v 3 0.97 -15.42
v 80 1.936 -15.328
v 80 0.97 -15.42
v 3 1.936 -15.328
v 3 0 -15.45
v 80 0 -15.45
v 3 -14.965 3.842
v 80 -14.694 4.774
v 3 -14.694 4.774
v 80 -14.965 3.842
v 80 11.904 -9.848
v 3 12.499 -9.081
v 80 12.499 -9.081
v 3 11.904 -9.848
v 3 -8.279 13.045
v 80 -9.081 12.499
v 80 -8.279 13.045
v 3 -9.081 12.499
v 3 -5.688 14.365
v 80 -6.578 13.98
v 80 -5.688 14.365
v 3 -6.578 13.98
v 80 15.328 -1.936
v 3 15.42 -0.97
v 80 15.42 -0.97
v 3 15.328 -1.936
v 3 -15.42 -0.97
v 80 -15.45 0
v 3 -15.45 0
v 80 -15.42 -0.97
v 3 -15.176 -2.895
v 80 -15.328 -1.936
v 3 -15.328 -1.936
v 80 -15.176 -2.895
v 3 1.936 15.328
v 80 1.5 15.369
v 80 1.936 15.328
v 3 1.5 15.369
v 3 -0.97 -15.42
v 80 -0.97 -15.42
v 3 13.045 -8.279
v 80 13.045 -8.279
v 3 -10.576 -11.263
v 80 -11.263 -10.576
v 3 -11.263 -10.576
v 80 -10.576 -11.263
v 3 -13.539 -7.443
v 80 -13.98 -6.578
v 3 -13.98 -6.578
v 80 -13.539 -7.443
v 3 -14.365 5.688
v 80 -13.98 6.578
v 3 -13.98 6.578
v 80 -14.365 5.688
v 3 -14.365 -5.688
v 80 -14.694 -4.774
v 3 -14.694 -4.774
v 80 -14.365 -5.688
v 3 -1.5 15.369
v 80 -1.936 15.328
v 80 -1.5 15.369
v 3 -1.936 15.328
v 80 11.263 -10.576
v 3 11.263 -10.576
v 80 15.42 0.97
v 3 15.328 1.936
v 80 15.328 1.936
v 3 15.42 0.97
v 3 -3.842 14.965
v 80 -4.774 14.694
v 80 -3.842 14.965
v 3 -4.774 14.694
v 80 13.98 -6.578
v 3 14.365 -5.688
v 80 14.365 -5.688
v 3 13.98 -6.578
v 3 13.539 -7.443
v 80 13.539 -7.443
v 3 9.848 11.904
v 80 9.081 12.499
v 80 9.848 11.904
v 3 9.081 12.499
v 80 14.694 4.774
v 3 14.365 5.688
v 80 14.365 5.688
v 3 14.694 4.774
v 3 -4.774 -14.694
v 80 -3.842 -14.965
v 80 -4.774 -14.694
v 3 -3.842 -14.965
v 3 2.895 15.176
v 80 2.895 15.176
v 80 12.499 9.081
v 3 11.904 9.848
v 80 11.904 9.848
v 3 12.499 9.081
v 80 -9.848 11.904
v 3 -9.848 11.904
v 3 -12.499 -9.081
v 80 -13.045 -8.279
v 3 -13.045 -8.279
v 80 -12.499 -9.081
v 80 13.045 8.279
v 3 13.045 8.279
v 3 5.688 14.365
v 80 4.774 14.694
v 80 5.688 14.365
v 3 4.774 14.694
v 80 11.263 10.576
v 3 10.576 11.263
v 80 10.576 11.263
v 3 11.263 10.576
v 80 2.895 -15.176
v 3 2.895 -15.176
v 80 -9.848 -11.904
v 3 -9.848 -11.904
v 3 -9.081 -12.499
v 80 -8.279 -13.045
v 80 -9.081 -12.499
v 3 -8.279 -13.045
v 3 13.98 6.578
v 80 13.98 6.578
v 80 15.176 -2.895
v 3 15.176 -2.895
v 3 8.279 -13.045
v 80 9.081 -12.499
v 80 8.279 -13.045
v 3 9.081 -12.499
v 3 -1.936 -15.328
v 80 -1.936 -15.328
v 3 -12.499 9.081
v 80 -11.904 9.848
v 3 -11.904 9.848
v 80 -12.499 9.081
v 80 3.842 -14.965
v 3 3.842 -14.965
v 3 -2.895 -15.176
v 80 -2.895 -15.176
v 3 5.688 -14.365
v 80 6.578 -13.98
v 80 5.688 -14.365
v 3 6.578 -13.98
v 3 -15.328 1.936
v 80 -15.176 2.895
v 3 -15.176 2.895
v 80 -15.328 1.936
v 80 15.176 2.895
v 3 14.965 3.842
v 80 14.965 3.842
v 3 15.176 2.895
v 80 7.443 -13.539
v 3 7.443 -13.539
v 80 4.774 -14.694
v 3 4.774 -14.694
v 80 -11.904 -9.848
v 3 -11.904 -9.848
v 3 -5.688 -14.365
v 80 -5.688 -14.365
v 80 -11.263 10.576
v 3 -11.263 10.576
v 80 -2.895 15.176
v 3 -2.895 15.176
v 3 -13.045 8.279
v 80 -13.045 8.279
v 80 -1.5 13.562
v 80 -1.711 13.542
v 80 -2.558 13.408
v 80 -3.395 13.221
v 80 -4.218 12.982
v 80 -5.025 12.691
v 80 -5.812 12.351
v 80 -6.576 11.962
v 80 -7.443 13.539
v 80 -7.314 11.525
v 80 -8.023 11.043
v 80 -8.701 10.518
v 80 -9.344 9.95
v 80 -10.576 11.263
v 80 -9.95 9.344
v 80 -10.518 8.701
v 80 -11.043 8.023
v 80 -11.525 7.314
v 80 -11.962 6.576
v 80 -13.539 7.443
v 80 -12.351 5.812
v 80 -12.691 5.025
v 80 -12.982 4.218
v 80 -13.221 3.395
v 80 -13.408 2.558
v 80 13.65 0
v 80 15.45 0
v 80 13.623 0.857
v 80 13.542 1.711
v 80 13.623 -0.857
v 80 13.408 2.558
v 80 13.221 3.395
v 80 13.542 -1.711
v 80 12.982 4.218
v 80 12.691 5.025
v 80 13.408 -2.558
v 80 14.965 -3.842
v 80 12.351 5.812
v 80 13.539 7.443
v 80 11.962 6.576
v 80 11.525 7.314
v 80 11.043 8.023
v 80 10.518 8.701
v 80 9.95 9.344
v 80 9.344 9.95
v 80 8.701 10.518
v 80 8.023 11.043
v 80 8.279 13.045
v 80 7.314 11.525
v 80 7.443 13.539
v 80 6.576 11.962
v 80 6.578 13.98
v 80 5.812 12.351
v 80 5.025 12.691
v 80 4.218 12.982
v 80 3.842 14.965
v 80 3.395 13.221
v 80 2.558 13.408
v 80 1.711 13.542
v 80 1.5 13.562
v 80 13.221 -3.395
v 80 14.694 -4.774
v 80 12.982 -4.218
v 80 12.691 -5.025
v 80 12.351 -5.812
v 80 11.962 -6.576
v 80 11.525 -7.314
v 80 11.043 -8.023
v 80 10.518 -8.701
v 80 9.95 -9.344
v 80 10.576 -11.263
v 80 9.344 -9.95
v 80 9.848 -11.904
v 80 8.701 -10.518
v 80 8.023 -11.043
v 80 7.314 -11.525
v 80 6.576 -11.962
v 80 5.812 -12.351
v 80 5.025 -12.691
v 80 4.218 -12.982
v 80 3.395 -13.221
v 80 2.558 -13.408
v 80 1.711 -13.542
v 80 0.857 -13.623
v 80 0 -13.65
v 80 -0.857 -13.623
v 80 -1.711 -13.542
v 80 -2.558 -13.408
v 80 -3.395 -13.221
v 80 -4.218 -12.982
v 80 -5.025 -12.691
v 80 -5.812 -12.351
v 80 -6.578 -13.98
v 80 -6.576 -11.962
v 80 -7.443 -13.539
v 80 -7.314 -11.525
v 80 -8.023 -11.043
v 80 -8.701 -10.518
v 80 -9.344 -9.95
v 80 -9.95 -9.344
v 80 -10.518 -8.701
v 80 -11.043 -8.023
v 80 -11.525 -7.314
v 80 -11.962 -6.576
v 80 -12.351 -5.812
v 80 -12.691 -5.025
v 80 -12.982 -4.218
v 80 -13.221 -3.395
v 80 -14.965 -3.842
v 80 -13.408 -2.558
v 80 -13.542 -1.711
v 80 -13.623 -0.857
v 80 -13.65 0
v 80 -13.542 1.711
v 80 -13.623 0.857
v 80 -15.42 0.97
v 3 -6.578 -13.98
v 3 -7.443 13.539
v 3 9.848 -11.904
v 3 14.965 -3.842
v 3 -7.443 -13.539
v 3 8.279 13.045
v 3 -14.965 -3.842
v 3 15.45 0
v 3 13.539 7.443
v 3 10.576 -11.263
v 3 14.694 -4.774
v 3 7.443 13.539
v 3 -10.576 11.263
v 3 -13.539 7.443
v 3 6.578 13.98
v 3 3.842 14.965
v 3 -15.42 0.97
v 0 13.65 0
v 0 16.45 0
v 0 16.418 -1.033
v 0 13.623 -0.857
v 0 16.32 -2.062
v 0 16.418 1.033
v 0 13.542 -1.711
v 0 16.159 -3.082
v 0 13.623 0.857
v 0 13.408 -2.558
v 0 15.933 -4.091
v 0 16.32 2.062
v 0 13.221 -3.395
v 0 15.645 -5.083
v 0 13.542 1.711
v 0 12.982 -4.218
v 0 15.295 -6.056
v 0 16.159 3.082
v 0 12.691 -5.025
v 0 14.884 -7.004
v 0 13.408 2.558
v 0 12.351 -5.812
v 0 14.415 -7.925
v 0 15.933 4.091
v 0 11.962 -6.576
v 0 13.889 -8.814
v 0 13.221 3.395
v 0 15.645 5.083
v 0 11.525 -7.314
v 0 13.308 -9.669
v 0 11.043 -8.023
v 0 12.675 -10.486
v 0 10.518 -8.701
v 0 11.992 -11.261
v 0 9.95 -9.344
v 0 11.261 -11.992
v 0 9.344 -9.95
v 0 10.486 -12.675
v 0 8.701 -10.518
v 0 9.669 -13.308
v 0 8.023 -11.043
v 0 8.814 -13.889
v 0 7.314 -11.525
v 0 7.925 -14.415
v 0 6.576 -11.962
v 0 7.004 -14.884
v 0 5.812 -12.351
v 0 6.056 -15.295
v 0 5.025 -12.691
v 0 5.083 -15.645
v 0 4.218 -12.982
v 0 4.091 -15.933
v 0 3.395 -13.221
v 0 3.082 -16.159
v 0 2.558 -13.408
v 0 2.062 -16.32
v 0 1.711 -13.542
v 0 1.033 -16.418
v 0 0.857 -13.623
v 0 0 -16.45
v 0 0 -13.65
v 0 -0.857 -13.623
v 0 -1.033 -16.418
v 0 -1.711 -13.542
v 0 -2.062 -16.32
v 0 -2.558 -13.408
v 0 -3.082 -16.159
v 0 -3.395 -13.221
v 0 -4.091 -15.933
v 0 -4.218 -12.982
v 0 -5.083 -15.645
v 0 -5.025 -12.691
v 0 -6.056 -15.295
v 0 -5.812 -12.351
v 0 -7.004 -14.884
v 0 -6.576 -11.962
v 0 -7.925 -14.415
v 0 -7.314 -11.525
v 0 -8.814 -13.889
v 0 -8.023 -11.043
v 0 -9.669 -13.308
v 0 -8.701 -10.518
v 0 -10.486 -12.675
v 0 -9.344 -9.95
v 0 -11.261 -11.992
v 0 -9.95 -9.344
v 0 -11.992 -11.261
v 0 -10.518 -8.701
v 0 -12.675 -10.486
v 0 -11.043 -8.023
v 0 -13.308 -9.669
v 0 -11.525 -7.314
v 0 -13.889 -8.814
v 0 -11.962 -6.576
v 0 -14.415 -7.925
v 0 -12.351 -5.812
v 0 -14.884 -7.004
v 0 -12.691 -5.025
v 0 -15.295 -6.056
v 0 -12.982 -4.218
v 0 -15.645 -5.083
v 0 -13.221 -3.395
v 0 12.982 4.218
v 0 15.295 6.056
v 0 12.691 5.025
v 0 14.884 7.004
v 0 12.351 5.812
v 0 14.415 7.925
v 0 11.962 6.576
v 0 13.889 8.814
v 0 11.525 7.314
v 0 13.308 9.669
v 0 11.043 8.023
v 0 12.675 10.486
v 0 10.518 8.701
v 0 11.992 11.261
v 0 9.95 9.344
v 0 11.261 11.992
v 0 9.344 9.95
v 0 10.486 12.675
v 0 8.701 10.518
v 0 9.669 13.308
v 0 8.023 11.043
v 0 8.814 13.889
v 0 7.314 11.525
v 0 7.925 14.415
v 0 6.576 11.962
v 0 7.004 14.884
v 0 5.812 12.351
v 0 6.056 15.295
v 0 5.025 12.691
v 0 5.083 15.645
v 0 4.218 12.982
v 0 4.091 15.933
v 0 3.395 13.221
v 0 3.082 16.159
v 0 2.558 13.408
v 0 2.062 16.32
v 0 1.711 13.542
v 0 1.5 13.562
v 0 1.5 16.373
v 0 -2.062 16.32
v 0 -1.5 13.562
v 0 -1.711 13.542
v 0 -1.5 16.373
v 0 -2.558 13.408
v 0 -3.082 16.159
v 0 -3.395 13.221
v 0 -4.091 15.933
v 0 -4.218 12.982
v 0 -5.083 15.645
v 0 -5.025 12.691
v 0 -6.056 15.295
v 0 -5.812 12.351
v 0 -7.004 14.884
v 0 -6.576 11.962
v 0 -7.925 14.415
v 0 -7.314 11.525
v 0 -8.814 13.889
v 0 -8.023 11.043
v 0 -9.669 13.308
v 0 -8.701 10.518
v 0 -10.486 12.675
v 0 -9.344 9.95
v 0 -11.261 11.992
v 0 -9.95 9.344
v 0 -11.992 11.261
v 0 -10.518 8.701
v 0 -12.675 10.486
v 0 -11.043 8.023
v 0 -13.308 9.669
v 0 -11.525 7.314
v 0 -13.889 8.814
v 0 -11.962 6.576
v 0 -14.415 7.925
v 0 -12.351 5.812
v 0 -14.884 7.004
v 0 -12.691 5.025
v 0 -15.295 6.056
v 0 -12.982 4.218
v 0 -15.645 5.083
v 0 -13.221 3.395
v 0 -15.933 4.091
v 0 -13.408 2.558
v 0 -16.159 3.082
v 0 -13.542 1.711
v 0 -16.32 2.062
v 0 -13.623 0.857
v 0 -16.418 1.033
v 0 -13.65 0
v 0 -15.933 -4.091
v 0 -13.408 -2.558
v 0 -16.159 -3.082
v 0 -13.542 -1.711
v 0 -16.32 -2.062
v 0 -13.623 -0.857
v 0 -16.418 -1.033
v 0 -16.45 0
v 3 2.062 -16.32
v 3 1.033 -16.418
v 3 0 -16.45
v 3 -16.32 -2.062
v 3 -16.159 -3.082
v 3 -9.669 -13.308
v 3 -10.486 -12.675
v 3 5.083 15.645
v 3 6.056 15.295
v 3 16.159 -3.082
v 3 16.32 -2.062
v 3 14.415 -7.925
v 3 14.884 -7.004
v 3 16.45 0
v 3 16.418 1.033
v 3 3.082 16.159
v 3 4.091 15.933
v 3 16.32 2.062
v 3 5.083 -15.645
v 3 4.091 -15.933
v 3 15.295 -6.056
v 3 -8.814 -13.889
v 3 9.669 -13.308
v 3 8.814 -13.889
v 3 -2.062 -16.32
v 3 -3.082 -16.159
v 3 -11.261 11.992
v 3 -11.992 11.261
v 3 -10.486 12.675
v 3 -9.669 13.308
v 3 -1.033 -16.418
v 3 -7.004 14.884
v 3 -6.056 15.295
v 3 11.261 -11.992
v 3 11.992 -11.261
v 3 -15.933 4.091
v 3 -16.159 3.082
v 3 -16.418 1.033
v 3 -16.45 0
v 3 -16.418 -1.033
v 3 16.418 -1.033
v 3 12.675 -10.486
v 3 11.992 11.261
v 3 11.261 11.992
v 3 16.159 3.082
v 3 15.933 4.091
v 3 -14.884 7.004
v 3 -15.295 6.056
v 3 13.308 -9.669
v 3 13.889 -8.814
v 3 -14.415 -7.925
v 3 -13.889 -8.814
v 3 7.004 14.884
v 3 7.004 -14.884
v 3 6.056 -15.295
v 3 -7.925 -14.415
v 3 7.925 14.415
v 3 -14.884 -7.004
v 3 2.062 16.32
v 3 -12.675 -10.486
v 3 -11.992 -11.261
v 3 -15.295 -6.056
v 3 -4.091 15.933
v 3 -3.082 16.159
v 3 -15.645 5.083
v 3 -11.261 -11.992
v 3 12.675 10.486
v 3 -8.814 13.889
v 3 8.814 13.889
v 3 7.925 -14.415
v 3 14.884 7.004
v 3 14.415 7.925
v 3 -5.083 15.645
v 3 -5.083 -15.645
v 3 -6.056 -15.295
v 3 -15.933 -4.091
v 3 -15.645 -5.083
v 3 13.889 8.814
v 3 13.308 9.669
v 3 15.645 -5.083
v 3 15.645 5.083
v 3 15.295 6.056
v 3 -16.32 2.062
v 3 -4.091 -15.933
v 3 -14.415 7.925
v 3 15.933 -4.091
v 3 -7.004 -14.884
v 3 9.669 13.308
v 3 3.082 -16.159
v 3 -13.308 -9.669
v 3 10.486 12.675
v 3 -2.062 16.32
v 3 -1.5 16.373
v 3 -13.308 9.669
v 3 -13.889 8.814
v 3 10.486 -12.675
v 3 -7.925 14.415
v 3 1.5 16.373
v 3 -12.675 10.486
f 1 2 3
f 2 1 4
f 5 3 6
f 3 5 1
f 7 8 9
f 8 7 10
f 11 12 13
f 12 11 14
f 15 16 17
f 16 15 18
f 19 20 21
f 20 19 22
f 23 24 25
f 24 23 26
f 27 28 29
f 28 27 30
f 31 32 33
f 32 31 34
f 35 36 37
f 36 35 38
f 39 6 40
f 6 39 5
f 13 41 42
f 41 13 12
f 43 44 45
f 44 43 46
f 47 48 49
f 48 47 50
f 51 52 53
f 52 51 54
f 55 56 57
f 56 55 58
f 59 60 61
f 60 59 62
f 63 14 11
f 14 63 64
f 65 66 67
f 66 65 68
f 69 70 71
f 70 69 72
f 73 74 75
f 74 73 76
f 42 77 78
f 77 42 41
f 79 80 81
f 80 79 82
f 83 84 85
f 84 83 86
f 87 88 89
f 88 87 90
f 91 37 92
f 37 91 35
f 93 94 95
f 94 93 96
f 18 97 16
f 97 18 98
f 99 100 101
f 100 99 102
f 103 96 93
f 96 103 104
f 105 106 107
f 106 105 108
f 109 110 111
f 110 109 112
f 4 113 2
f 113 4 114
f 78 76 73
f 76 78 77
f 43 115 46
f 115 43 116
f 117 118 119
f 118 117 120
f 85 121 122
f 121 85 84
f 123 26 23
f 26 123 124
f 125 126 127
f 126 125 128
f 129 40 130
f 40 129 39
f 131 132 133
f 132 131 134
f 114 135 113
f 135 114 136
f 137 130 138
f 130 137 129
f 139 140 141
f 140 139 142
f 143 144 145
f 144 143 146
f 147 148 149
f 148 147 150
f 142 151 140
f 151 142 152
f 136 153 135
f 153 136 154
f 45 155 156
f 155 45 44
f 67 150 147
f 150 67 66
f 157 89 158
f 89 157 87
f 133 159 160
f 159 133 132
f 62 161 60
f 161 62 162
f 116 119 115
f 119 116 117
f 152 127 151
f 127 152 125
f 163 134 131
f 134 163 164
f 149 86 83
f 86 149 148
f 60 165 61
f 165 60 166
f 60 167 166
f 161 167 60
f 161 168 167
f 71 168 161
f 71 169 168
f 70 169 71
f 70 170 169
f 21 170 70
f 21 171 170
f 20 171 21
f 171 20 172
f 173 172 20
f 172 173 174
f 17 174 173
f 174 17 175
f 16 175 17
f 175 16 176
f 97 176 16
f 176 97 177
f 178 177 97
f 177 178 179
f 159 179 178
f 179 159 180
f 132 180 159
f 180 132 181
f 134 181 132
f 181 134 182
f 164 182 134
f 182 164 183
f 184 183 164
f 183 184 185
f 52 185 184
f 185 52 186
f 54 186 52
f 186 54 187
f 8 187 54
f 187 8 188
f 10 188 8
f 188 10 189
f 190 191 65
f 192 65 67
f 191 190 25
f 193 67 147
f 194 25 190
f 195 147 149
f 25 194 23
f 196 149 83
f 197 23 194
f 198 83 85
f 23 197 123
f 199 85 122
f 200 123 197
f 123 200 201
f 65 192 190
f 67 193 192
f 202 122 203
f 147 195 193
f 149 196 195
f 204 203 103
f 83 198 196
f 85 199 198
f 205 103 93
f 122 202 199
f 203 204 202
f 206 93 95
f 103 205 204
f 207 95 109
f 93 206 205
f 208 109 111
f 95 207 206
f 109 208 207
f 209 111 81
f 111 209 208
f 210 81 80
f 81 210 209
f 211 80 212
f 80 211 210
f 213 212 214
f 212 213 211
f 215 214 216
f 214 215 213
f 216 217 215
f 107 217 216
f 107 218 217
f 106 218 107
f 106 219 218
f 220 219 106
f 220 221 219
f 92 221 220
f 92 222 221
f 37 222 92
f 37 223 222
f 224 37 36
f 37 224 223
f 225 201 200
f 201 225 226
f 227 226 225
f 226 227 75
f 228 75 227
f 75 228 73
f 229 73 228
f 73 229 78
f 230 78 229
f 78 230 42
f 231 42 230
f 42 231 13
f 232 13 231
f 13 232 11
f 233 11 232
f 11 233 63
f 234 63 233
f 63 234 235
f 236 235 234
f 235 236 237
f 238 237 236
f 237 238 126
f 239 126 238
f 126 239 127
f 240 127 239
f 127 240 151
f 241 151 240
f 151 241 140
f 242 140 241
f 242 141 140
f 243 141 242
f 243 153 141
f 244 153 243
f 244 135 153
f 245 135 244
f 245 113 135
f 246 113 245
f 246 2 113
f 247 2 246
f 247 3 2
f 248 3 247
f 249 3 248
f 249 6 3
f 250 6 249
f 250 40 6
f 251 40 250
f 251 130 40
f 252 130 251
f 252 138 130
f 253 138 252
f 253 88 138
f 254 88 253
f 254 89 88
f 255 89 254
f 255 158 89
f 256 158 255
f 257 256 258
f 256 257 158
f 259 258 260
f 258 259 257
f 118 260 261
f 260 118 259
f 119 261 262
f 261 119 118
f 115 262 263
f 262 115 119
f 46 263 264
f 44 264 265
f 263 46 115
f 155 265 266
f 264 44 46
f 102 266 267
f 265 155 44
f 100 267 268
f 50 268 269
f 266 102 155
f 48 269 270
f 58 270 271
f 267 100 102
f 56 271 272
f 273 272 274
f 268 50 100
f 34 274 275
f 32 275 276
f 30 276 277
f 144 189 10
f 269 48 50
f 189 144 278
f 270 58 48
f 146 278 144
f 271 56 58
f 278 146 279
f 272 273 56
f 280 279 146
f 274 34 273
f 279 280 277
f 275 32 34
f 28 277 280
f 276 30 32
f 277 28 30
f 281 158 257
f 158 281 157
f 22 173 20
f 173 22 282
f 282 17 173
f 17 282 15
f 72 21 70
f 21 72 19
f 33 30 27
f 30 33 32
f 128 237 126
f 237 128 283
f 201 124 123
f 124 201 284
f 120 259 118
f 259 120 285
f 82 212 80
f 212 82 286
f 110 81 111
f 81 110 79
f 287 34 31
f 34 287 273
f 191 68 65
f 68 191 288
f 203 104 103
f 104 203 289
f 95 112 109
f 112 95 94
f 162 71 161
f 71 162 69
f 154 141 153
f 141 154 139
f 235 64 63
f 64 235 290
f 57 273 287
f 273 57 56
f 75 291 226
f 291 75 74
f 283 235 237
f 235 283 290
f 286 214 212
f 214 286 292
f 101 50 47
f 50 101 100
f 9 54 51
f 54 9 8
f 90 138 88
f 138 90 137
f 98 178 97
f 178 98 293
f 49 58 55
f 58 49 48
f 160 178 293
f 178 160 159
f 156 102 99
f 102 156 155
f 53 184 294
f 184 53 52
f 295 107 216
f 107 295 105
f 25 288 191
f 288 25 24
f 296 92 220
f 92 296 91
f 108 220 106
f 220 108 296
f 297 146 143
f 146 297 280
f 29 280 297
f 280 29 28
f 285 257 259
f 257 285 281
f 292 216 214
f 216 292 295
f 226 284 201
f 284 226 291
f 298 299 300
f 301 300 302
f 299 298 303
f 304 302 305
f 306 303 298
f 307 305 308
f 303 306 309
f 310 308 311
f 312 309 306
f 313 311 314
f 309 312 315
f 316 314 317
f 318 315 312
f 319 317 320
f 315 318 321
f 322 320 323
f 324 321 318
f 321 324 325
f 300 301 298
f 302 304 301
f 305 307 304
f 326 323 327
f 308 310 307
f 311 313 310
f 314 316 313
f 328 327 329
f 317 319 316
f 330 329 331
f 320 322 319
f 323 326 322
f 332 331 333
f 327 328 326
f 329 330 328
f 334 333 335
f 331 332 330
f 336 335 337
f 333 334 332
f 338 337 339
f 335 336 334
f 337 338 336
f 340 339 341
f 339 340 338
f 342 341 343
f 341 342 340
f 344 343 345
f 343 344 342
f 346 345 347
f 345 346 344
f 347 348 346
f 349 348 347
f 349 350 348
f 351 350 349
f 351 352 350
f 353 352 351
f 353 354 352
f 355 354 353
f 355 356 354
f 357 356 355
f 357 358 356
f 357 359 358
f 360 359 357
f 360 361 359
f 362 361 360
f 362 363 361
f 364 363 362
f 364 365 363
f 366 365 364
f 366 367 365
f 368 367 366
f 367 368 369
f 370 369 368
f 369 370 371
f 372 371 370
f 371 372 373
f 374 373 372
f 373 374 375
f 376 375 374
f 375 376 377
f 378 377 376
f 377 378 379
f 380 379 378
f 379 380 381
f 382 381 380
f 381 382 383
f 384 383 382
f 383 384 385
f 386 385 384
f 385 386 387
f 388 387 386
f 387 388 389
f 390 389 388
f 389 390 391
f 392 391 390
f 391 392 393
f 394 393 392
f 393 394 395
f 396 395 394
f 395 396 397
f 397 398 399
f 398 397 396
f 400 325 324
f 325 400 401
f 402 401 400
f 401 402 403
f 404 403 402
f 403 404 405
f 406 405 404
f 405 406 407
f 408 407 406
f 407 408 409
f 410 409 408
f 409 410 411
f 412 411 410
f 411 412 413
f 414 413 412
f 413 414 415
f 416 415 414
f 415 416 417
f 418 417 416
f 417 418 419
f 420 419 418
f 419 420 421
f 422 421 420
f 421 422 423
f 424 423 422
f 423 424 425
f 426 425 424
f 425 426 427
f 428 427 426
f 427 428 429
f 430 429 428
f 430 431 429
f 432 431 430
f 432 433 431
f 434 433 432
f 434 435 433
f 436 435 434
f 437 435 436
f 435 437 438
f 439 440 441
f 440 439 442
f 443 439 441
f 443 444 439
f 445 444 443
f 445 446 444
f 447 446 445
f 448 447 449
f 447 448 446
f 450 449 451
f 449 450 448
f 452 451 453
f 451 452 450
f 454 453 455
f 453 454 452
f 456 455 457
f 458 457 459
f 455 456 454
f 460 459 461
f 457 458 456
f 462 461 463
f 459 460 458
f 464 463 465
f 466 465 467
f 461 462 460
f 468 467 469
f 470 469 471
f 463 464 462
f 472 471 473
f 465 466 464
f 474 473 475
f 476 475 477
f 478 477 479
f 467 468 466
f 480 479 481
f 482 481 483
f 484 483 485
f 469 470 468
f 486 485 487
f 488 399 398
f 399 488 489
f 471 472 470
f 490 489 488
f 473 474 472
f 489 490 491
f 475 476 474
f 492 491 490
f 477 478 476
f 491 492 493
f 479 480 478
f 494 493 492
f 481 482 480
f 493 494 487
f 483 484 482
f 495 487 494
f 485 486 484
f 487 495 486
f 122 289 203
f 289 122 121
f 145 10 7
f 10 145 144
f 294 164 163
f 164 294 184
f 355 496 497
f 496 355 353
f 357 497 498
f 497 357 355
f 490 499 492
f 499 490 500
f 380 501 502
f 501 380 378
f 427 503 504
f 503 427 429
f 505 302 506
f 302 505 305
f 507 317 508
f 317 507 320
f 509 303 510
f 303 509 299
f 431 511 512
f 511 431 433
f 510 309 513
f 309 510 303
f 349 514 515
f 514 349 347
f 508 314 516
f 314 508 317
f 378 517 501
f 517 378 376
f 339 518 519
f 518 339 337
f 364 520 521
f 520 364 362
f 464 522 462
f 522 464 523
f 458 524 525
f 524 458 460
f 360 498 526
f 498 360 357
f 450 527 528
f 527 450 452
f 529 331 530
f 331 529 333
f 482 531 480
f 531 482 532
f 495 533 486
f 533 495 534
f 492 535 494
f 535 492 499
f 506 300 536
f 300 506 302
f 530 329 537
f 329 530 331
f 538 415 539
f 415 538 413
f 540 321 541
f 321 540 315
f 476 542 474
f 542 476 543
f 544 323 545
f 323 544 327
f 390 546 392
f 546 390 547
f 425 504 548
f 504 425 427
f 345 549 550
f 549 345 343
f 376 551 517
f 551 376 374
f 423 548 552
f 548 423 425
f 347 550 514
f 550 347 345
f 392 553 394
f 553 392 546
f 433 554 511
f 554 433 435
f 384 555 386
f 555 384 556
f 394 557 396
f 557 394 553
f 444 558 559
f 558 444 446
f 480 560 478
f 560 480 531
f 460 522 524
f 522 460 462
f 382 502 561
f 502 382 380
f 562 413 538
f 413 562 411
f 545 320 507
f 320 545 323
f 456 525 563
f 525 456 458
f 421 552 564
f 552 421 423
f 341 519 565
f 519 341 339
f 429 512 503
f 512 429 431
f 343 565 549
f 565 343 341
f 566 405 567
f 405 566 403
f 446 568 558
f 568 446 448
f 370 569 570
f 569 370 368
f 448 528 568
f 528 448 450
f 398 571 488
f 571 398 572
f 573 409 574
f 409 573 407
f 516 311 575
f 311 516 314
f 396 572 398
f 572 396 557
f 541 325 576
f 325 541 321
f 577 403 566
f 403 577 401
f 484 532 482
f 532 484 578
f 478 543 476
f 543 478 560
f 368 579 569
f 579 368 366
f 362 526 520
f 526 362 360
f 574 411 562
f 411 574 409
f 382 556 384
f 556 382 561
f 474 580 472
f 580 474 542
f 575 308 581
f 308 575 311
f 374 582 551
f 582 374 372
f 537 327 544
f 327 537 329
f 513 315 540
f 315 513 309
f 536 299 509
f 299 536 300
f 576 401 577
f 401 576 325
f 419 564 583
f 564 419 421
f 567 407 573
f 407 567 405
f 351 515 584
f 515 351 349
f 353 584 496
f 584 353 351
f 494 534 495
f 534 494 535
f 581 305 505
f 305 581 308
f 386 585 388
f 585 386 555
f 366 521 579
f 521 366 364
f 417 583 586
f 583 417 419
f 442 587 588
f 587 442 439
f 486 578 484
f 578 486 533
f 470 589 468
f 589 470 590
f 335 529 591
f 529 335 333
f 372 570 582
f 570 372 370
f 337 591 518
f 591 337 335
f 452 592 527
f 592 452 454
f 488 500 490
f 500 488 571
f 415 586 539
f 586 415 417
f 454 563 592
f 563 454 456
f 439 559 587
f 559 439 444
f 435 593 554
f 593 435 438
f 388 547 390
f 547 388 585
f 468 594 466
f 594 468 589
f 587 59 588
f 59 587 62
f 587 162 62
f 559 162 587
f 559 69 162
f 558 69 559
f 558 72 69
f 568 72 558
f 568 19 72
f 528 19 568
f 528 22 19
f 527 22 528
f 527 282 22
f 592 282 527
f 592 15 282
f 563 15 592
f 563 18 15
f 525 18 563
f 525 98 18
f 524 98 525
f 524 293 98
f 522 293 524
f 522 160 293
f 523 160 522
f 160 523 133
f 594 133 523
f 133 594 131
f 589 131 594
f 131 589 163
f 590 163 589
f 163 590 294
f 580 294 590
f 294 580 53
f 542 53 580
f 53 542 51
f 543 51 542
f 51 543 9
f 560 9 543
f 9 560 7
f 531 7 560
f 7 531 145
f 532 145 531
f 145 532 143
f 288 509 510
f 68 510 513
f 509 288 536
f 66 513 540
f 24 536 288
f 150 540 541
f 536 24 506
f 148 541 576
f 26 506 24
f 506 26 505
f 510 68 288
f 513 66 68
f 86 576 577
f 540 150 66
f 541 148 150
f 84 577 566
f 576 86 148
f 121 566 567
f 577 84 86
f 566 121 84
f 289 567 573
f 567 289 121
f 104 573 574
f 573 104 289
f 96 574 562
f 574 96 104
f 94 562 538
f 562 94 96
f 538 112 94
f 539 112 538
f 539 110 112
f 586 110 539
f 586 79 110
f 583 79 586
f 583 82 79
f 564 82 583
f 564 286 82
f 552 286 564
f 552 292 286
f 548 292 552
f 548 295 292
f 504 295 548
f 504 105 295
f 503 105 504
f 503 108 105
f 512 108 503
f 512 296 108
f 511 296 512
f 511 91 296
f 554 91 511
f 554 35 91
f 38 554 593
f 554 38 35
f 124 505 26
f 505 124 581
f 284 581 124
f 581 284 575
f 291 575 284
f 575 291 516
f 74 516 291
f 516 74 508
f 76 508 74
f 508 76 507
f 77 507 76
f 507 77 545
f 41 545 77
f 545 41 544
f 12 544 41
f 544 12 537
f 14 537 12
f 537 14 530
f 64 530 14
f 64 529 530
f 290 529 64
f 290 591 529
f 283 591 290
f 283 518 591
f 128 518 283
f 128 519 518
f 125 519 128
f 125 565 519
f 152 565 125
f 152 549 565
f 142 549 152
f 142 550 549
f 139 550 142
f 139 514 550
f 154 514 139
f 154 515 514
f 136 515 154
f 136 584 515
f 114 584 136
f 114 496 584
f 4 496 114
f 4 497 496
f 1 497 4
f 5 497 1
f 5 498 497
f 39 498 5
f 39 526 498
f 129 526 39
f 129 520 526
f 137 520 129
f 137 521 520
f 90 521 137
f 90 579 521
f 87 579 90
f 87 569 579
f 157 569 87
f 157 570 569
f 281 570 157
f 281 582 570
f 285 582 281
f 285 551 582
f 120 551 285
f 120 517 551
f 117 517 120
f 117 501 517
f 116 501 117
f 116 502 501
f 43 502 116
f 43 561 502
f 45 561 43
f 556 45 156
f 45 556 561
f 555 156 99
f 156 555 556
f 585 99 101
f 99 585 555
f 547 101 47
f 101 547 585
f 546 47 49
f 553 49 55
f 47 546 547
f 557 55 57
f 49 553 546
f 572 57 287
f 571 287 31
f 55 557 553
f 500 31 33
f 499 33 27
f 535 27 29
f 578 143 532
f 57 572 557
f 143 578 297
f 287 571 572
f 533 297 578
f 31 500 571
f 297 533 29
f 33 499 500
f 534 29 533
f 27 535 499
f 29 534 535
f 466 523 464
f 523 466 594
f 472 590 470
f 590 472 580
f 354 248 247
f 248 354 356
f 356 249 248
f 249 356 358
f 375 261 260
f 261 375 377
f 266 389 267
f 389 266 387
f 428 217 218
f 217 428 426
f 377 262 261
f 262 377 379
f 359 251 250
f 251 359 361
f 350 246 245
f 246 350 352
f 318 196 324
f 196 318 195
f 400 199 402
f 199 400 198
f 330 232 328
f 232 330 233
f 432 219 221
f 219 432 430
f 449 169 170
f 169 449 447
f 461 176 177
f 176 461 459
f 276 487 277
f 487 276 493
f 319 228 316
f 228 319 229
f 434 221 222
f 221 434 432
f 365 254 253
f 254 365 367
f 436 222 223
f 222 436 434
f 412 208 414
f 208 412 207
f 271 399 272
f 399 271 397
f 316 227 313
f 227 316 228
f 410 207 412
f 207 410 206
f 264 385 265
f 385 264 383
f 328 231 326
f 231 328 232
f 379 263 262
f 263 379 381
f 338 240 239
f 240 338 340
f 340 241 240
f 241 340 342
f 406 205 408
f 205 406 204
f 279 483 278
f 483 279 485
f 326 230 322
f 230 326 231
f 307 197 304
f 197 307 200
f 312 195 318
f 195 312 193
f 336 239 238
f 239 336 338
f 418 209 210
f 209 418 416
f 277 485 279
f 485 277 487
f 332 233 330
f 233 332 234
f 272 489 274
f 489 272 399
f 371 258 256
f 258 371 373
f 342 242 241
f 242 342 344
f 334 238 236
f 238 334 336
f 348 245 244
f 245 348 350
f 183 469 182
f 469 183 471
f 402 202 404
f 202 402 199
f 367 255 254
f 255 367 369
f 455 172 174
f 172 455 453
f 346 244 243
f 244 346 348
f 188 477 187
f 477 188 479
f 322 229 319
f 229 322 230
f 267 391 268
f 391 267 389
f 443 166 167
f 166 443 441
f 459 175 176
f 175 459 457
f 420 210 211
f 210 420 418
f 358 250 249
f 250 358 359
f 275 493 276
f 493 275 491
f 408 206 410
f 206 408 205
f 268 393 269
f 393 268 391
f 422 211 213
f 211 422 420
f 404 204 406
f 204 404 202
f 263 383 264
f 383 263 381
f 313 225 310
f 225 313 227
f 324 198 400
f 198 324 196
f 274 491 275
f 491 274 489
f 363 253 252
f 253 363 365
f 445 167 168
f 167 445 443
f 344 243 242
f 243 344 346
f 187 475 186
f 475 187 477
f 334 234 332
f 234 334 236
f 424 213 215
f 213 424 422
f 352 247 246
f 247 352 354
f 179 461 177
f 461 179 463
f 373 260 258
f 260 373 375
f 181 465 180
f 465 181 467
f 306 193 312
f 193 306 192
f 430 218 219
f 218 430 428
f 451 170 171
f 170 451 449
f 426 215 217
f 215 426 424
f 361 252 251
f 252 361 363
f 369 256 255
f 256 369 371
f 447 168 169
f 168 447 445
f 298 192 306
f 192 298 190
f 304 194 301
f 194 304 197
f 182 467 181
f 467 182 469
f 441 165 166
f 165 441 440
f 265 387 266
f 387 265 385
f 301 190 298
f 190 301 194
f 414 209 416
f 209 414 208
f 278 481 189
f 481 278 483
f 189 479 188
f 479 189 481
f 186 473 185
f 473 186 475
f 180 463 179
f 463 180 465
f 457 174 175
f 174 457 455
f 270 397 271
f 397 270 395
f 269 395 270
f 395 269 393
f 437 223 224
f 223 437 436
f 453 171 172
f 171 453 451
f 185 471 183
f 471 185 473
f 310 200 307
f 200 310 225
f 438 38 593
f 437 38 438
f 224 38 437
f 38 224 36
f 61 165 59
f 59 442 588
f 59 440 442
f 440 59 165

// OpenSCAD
D1 = 27.2 + 0.1; //mm
D2 = 30.8 + 0.1; // mm
H = 80; //mm

$fn=100;


rotate([00,90,0]) 
difference() {
    union(){
        cylinder(h=H, d=D2);
        cylinder(h=3, d=D2+2);
    }
    union(){    
       cylinder(h=H, d=D1);
       translate([-D2/2-10,-1.5,0]) cube([D2/2,3,H]);
    }
}
